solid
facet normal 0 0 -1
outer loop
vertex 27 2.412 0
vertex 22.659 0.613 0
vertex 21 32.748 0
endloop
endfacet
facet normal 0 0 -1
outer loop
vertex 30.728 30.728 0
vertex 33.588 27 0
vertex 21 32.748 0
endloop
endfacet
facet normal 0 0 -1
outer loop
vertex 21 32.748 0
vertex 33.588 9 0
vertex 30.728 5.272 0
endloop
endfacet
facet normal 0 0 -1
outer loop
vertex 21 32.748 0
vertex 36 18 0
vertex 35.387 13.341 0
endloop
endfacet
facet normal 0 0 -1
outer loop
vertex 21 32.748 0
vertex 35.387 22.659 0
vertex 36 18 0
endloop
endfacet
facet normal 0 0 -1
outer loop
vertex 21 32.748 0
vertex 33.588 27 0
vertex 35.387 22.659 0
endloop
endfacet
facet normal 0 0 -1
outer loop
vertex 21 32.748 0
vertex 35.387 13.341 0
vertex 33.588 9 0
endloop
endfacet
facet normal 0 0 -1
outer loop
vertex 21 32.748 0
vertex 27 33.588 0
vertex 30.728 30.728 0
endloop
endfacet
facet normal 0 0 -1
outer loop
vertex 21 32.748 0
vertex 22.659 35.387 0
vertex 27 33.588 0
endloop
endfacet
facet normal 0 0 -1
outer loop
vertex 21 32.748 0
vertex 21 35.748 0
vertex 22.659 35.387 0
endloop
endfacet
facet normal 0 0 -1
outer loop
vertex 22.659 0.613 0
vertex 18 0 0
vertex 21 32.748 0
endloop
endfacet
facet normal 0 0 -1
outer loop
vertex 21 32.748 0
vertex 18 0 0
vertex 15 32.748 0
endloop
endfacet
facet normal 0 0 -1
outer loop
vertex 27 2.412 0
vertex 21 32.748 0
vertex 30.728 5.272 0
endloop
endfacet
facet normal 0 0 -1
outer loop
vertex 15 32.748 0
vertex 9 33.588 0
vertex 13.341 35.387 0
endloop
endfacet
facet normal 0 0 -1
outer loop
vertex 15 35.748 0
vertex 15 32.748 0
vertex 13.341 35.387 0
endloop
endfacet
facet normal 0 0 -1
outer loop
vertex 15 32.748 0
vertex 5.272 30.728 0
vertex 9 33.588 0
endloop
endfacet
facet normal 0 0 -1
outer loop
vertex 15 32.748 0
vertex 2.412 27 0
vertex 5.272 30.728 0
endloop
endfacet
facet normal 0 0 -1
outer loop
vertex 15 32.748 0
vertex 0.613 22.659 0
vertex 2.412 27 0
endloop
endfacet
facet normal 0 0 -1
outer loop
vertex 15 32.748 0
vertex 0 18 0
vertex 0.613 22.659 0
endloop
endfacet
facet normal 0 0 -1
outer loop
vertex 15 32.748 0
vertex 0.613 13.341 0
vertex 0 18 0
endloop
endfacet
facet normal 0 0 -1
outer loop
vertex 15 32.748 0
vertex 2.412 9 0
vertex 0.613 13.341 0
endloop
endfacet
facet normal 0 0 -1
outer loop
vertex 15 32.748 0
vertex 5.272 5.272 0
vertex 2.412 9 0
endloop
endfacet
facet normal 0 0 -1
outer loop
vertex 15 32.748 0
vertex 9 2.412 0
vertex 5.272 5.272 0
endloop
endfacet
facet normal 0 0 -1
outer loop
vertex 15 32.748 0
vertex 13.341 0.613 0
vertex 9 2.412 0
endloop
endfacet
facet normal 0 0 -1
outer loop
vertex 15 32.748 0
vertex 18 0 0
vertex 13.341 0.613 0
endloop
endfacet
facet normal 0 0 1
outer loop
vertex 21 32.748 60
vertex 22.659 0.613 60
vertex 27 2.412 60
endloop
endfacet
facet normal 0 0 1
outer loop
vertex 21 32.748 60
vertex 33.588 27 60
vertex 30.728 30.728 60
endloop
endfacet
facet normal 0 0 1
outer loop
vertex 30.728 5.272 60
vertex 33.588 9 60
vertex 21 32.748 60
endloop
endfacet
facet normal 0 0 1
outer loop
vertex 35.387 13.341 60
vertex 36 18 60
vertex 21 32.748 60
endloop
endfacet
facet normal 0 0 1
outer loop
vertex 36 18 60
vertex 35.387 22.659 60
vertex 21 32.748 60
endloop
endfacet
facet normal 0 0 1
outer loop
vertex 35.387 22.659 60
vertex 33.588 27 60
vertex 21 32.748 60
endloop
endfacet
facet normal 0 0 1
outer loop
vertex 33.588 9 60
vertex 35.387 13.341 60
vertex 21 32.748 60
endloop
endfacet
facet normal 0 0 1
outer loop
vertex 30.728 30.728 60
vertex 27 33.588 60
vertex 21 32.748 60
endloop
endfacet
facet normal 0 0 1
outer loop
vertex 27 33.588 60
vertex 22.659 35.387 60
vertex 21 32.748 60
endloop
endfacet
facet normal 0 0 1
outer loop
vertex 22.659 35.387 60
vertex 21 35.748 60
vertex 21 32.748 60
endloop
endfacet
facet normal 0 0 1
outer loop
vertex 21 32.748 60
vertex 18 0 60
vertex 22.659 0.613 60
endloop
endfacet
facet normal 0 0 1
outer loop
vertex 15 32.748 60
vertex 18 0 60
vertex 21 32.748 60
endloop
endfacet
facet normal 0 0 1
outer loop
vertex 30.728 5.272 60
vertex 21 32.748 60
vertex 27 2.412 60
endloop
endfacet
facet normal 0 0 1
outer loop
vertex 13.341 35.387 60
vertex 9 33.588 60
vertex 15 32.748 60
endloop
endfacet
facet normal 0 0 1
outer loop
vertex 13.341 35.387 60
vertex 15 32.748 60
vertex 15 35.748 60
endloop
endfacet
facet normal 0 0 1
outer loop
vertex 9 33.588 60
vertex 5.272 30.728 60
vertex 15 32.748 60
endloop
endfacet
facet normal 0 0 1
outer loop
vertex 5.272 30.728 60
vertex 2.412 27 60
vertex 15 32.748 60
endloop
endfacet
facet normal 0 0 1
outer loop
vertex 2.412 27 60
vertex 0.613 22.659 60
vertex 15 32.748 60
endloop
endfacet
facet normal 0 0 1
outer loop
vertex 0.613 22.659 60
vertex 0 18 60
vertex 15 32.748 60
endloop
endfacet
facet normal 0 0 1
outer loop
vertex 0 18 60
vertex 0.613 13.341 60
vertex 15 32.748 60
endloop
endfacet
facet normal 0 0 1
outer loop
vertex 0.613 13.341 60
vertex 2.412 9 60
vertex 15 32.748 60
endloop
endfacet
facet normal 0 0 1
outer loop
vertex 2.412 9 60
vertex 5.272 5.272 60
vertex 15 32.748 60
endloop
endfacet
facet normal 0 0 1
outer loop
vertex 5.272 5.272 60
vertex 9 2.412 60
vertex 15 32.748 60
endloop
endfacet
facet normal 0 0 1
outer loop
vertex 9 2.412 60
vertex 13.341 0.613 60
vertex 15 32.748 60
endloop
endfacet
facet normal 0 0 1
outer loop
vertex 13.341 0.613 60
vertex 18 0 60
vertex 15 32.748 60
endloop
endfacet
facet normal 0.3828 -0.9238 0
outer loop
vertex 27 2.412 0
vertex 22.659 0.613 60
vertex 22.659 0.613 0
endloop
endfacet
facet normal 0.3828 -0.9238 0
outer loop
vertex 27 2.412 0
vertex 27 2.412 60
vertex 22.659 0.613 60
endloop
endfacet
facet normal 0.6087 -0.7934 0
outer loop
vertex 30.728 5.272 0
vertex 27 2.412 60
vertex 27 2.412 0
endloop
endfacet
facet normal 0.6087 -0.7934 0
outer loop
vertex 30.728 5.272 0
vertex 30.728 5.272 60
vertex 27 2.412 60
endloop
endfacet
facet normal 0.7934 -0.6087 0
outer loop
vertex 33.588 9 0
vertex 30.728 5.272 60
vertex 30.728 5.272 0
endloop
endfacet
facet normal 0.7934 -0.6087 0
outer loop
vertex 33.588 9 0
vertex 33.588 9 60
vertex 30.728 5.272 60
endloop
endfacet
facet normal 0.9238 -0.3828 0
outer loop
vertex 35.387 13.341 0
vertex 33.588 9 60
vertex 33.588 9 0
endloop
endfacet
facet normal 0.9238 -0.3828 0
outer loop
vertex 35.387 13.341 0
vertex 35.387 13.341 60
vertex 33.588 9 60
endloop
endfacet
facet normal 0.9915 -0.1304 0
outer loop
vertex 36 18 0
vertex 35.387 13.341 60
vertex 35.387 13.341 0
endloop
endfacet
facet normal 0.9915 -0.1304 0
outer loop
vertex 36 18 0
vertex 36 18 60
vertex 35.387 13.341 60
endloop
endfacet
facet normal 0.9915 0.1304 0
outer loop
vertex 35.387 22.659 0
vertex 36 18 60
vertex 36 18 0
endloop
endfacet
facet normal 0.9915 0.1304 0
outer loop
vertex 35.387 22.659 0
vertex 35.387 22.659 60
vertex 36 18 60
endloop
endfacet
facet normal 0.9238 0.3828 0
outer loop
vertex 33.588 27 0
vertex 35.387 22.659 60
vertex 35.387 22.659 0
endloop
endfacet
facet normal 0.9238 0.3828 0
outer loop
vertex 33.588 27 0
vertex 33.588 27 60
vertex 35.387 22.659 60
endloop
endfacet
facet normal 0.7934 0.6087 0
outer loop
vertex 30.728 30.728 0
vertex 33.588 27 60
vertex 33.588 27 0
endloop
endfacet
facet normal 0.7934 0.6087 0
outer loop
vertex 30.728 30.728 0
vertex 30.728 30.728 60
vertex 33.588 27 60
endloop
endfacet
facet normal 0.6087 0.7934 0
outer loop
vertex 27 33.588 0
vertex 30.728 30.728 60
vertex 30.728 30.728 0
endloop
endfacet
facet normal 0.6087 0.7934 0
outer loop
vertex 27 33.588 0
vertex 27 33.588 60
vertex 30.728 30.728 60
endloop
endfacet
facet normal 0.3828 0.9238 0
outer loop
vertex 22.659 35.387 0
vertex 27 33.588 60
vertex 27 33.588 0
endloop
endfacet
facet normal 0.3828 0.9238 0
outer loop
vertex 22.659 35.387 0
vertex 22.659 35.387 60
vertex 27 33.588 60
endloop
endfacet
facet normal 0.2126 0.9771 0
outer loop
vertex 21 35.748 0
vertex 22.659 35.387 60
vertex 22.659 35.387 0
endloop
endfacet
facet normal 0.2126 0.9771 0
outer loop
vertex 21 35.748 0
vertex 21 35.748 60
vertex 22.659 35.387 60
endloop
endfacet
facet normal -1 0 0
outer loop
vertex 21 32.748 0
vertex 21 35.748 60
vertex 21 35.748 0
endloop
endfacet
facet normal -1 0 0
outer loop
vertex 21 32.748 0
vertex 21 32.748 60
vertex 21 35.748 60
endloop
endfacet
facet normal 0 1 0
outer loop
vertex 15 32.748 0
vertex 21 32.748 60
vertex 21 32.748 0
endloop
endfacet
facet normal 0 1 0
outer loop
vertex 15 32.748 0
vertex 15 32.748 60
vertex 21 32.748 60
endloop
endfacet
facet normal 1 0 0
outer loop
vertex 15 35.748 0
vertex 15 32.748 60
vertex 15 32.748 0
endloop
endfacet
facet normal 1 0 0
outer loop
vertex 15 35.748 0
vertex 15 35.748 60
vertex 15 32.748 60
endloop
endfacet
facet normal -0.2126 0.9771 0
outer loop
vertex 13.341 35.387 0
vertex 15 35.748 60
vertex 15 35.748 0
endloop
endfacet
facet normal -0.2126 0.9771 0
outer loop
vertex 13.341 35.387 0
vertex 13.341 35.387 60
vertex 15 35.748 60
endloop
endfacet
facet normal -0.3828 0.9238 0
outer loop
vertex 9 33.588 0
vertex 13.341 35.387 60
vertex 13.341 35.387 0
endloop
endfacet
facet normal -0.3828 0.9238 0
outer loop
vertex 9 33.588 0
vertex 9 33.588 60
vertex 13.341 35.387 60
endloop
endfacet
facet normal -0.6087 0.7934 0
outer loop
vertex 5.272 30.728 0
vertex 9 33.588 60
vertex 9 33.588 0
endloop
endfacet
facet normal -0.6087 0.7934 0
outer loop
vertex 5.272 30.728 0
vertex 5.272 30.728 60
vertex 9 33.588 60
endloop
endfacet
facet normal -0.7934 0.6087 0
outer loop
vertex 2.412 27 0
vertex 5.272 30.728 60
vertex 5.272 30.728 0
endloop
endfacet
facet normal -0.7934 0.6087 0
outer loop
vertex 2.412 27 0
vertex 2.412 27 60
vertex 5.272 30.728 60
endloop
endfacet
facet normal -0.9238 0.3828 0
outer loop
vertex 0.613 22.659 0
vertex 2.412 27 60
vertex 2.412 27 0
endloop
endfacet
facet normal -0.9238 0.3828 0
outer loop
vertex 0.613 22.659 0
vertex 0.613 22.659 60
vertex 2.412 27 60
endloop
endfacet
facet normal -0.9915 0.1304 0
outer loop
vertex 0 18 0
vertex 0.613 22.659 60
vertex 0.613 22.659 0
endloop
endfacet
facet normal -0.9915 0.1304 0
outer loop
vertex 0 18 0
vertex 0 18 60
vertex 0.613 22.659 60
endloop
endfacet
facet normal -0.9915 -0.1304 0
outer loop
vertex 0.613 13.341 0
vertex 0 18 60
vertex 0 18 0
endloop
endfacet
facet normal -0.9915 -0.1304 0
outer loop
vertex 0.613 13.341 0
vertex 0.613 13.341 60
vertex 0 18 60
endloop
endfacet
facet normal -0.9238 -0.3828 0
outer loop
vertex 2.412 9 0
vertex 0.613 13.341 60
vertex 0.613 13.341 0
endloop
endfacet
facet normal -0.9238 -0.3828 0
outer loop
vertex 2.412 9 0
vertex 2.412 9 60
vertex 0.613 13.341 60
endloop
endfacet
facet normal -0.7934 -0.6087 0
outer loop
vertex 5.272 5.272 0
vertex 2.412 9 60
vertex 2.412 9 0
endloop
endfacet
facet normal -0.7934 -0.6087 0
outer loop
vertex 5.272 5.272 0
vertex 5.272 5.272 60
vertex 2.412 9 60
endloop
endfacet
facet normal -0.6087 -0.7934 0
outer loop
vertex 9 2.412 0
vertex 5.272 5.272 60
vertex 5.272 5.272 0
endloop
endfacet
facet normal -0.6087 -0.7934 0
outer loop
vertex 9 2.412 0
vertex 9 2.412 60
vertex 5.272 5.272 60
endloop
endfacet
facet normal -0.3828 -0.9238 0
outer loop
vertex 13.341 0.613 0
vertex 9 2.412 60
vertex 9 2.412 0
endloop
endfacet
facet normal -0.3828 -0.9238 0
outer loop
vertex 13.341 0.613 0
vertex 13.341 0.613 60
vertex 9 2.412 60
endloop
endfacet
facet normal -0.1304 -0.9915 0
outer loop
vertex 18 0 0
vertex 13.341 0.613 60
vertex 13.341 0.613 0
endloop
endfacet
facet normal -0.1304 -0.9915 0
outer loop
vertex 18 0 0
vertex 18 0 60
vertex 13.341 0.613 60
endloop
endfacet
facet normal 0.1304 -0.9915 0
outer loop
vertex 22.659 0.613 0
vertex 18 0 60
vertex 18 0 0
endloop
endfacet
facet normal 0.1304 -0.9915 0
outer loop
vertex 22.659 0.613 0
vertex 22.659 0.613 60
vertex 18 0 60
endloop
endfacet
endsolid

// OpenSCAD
$fn = 32;

// ----------------------------------------------------------------------
// Keyway shaft: d36 shaft, key 6 x 3 mm
// ----------------------------------------------------------------------

// --- parameters (mm) ---
shaft_r = 18;             // shaft radius
key_w = 6;                // keyway width
key_d = 3;                // keyway depth below the surface line
plate_t = 60;             // shaft length, Z (extrusion height)
fit_tol = 0.1;            // declared fit tolerance (prompt contract)
free_tol = 0.5;           // declared free tolerance (prompt contract)

shaft_d = 2 * shaft_r;  // shaft diameter
circle_step = 15;  // polygon sampling step, degrees

profile = [[13.341, 35.387], [9, 33.588], [5.272, 30.728], [2.412, 27], [0.613, 22.659], [0, 18], [0.613, 13.341], [2.412, 9], [5.272, 5.272], [9, 2.412], [13.341, 0.613], [18, 0], [22.659, 0.613], [27, 2.412], [30.728, 5.272], [33.588, 9], [35.387, 13.341], [36, 18], [35.387, 22.659], [33.588, 27], [30.728, 30.728], [27, 33.588], [22.659, 35.387], [21, 35.748], [21, 32.748], [15, 32.748], [15, 35.748]];  // primary outline, 27 points, counter clockwise

// --- the one profile operation ---
linear_extrude(height = plate_t) polygon(points = profile);
